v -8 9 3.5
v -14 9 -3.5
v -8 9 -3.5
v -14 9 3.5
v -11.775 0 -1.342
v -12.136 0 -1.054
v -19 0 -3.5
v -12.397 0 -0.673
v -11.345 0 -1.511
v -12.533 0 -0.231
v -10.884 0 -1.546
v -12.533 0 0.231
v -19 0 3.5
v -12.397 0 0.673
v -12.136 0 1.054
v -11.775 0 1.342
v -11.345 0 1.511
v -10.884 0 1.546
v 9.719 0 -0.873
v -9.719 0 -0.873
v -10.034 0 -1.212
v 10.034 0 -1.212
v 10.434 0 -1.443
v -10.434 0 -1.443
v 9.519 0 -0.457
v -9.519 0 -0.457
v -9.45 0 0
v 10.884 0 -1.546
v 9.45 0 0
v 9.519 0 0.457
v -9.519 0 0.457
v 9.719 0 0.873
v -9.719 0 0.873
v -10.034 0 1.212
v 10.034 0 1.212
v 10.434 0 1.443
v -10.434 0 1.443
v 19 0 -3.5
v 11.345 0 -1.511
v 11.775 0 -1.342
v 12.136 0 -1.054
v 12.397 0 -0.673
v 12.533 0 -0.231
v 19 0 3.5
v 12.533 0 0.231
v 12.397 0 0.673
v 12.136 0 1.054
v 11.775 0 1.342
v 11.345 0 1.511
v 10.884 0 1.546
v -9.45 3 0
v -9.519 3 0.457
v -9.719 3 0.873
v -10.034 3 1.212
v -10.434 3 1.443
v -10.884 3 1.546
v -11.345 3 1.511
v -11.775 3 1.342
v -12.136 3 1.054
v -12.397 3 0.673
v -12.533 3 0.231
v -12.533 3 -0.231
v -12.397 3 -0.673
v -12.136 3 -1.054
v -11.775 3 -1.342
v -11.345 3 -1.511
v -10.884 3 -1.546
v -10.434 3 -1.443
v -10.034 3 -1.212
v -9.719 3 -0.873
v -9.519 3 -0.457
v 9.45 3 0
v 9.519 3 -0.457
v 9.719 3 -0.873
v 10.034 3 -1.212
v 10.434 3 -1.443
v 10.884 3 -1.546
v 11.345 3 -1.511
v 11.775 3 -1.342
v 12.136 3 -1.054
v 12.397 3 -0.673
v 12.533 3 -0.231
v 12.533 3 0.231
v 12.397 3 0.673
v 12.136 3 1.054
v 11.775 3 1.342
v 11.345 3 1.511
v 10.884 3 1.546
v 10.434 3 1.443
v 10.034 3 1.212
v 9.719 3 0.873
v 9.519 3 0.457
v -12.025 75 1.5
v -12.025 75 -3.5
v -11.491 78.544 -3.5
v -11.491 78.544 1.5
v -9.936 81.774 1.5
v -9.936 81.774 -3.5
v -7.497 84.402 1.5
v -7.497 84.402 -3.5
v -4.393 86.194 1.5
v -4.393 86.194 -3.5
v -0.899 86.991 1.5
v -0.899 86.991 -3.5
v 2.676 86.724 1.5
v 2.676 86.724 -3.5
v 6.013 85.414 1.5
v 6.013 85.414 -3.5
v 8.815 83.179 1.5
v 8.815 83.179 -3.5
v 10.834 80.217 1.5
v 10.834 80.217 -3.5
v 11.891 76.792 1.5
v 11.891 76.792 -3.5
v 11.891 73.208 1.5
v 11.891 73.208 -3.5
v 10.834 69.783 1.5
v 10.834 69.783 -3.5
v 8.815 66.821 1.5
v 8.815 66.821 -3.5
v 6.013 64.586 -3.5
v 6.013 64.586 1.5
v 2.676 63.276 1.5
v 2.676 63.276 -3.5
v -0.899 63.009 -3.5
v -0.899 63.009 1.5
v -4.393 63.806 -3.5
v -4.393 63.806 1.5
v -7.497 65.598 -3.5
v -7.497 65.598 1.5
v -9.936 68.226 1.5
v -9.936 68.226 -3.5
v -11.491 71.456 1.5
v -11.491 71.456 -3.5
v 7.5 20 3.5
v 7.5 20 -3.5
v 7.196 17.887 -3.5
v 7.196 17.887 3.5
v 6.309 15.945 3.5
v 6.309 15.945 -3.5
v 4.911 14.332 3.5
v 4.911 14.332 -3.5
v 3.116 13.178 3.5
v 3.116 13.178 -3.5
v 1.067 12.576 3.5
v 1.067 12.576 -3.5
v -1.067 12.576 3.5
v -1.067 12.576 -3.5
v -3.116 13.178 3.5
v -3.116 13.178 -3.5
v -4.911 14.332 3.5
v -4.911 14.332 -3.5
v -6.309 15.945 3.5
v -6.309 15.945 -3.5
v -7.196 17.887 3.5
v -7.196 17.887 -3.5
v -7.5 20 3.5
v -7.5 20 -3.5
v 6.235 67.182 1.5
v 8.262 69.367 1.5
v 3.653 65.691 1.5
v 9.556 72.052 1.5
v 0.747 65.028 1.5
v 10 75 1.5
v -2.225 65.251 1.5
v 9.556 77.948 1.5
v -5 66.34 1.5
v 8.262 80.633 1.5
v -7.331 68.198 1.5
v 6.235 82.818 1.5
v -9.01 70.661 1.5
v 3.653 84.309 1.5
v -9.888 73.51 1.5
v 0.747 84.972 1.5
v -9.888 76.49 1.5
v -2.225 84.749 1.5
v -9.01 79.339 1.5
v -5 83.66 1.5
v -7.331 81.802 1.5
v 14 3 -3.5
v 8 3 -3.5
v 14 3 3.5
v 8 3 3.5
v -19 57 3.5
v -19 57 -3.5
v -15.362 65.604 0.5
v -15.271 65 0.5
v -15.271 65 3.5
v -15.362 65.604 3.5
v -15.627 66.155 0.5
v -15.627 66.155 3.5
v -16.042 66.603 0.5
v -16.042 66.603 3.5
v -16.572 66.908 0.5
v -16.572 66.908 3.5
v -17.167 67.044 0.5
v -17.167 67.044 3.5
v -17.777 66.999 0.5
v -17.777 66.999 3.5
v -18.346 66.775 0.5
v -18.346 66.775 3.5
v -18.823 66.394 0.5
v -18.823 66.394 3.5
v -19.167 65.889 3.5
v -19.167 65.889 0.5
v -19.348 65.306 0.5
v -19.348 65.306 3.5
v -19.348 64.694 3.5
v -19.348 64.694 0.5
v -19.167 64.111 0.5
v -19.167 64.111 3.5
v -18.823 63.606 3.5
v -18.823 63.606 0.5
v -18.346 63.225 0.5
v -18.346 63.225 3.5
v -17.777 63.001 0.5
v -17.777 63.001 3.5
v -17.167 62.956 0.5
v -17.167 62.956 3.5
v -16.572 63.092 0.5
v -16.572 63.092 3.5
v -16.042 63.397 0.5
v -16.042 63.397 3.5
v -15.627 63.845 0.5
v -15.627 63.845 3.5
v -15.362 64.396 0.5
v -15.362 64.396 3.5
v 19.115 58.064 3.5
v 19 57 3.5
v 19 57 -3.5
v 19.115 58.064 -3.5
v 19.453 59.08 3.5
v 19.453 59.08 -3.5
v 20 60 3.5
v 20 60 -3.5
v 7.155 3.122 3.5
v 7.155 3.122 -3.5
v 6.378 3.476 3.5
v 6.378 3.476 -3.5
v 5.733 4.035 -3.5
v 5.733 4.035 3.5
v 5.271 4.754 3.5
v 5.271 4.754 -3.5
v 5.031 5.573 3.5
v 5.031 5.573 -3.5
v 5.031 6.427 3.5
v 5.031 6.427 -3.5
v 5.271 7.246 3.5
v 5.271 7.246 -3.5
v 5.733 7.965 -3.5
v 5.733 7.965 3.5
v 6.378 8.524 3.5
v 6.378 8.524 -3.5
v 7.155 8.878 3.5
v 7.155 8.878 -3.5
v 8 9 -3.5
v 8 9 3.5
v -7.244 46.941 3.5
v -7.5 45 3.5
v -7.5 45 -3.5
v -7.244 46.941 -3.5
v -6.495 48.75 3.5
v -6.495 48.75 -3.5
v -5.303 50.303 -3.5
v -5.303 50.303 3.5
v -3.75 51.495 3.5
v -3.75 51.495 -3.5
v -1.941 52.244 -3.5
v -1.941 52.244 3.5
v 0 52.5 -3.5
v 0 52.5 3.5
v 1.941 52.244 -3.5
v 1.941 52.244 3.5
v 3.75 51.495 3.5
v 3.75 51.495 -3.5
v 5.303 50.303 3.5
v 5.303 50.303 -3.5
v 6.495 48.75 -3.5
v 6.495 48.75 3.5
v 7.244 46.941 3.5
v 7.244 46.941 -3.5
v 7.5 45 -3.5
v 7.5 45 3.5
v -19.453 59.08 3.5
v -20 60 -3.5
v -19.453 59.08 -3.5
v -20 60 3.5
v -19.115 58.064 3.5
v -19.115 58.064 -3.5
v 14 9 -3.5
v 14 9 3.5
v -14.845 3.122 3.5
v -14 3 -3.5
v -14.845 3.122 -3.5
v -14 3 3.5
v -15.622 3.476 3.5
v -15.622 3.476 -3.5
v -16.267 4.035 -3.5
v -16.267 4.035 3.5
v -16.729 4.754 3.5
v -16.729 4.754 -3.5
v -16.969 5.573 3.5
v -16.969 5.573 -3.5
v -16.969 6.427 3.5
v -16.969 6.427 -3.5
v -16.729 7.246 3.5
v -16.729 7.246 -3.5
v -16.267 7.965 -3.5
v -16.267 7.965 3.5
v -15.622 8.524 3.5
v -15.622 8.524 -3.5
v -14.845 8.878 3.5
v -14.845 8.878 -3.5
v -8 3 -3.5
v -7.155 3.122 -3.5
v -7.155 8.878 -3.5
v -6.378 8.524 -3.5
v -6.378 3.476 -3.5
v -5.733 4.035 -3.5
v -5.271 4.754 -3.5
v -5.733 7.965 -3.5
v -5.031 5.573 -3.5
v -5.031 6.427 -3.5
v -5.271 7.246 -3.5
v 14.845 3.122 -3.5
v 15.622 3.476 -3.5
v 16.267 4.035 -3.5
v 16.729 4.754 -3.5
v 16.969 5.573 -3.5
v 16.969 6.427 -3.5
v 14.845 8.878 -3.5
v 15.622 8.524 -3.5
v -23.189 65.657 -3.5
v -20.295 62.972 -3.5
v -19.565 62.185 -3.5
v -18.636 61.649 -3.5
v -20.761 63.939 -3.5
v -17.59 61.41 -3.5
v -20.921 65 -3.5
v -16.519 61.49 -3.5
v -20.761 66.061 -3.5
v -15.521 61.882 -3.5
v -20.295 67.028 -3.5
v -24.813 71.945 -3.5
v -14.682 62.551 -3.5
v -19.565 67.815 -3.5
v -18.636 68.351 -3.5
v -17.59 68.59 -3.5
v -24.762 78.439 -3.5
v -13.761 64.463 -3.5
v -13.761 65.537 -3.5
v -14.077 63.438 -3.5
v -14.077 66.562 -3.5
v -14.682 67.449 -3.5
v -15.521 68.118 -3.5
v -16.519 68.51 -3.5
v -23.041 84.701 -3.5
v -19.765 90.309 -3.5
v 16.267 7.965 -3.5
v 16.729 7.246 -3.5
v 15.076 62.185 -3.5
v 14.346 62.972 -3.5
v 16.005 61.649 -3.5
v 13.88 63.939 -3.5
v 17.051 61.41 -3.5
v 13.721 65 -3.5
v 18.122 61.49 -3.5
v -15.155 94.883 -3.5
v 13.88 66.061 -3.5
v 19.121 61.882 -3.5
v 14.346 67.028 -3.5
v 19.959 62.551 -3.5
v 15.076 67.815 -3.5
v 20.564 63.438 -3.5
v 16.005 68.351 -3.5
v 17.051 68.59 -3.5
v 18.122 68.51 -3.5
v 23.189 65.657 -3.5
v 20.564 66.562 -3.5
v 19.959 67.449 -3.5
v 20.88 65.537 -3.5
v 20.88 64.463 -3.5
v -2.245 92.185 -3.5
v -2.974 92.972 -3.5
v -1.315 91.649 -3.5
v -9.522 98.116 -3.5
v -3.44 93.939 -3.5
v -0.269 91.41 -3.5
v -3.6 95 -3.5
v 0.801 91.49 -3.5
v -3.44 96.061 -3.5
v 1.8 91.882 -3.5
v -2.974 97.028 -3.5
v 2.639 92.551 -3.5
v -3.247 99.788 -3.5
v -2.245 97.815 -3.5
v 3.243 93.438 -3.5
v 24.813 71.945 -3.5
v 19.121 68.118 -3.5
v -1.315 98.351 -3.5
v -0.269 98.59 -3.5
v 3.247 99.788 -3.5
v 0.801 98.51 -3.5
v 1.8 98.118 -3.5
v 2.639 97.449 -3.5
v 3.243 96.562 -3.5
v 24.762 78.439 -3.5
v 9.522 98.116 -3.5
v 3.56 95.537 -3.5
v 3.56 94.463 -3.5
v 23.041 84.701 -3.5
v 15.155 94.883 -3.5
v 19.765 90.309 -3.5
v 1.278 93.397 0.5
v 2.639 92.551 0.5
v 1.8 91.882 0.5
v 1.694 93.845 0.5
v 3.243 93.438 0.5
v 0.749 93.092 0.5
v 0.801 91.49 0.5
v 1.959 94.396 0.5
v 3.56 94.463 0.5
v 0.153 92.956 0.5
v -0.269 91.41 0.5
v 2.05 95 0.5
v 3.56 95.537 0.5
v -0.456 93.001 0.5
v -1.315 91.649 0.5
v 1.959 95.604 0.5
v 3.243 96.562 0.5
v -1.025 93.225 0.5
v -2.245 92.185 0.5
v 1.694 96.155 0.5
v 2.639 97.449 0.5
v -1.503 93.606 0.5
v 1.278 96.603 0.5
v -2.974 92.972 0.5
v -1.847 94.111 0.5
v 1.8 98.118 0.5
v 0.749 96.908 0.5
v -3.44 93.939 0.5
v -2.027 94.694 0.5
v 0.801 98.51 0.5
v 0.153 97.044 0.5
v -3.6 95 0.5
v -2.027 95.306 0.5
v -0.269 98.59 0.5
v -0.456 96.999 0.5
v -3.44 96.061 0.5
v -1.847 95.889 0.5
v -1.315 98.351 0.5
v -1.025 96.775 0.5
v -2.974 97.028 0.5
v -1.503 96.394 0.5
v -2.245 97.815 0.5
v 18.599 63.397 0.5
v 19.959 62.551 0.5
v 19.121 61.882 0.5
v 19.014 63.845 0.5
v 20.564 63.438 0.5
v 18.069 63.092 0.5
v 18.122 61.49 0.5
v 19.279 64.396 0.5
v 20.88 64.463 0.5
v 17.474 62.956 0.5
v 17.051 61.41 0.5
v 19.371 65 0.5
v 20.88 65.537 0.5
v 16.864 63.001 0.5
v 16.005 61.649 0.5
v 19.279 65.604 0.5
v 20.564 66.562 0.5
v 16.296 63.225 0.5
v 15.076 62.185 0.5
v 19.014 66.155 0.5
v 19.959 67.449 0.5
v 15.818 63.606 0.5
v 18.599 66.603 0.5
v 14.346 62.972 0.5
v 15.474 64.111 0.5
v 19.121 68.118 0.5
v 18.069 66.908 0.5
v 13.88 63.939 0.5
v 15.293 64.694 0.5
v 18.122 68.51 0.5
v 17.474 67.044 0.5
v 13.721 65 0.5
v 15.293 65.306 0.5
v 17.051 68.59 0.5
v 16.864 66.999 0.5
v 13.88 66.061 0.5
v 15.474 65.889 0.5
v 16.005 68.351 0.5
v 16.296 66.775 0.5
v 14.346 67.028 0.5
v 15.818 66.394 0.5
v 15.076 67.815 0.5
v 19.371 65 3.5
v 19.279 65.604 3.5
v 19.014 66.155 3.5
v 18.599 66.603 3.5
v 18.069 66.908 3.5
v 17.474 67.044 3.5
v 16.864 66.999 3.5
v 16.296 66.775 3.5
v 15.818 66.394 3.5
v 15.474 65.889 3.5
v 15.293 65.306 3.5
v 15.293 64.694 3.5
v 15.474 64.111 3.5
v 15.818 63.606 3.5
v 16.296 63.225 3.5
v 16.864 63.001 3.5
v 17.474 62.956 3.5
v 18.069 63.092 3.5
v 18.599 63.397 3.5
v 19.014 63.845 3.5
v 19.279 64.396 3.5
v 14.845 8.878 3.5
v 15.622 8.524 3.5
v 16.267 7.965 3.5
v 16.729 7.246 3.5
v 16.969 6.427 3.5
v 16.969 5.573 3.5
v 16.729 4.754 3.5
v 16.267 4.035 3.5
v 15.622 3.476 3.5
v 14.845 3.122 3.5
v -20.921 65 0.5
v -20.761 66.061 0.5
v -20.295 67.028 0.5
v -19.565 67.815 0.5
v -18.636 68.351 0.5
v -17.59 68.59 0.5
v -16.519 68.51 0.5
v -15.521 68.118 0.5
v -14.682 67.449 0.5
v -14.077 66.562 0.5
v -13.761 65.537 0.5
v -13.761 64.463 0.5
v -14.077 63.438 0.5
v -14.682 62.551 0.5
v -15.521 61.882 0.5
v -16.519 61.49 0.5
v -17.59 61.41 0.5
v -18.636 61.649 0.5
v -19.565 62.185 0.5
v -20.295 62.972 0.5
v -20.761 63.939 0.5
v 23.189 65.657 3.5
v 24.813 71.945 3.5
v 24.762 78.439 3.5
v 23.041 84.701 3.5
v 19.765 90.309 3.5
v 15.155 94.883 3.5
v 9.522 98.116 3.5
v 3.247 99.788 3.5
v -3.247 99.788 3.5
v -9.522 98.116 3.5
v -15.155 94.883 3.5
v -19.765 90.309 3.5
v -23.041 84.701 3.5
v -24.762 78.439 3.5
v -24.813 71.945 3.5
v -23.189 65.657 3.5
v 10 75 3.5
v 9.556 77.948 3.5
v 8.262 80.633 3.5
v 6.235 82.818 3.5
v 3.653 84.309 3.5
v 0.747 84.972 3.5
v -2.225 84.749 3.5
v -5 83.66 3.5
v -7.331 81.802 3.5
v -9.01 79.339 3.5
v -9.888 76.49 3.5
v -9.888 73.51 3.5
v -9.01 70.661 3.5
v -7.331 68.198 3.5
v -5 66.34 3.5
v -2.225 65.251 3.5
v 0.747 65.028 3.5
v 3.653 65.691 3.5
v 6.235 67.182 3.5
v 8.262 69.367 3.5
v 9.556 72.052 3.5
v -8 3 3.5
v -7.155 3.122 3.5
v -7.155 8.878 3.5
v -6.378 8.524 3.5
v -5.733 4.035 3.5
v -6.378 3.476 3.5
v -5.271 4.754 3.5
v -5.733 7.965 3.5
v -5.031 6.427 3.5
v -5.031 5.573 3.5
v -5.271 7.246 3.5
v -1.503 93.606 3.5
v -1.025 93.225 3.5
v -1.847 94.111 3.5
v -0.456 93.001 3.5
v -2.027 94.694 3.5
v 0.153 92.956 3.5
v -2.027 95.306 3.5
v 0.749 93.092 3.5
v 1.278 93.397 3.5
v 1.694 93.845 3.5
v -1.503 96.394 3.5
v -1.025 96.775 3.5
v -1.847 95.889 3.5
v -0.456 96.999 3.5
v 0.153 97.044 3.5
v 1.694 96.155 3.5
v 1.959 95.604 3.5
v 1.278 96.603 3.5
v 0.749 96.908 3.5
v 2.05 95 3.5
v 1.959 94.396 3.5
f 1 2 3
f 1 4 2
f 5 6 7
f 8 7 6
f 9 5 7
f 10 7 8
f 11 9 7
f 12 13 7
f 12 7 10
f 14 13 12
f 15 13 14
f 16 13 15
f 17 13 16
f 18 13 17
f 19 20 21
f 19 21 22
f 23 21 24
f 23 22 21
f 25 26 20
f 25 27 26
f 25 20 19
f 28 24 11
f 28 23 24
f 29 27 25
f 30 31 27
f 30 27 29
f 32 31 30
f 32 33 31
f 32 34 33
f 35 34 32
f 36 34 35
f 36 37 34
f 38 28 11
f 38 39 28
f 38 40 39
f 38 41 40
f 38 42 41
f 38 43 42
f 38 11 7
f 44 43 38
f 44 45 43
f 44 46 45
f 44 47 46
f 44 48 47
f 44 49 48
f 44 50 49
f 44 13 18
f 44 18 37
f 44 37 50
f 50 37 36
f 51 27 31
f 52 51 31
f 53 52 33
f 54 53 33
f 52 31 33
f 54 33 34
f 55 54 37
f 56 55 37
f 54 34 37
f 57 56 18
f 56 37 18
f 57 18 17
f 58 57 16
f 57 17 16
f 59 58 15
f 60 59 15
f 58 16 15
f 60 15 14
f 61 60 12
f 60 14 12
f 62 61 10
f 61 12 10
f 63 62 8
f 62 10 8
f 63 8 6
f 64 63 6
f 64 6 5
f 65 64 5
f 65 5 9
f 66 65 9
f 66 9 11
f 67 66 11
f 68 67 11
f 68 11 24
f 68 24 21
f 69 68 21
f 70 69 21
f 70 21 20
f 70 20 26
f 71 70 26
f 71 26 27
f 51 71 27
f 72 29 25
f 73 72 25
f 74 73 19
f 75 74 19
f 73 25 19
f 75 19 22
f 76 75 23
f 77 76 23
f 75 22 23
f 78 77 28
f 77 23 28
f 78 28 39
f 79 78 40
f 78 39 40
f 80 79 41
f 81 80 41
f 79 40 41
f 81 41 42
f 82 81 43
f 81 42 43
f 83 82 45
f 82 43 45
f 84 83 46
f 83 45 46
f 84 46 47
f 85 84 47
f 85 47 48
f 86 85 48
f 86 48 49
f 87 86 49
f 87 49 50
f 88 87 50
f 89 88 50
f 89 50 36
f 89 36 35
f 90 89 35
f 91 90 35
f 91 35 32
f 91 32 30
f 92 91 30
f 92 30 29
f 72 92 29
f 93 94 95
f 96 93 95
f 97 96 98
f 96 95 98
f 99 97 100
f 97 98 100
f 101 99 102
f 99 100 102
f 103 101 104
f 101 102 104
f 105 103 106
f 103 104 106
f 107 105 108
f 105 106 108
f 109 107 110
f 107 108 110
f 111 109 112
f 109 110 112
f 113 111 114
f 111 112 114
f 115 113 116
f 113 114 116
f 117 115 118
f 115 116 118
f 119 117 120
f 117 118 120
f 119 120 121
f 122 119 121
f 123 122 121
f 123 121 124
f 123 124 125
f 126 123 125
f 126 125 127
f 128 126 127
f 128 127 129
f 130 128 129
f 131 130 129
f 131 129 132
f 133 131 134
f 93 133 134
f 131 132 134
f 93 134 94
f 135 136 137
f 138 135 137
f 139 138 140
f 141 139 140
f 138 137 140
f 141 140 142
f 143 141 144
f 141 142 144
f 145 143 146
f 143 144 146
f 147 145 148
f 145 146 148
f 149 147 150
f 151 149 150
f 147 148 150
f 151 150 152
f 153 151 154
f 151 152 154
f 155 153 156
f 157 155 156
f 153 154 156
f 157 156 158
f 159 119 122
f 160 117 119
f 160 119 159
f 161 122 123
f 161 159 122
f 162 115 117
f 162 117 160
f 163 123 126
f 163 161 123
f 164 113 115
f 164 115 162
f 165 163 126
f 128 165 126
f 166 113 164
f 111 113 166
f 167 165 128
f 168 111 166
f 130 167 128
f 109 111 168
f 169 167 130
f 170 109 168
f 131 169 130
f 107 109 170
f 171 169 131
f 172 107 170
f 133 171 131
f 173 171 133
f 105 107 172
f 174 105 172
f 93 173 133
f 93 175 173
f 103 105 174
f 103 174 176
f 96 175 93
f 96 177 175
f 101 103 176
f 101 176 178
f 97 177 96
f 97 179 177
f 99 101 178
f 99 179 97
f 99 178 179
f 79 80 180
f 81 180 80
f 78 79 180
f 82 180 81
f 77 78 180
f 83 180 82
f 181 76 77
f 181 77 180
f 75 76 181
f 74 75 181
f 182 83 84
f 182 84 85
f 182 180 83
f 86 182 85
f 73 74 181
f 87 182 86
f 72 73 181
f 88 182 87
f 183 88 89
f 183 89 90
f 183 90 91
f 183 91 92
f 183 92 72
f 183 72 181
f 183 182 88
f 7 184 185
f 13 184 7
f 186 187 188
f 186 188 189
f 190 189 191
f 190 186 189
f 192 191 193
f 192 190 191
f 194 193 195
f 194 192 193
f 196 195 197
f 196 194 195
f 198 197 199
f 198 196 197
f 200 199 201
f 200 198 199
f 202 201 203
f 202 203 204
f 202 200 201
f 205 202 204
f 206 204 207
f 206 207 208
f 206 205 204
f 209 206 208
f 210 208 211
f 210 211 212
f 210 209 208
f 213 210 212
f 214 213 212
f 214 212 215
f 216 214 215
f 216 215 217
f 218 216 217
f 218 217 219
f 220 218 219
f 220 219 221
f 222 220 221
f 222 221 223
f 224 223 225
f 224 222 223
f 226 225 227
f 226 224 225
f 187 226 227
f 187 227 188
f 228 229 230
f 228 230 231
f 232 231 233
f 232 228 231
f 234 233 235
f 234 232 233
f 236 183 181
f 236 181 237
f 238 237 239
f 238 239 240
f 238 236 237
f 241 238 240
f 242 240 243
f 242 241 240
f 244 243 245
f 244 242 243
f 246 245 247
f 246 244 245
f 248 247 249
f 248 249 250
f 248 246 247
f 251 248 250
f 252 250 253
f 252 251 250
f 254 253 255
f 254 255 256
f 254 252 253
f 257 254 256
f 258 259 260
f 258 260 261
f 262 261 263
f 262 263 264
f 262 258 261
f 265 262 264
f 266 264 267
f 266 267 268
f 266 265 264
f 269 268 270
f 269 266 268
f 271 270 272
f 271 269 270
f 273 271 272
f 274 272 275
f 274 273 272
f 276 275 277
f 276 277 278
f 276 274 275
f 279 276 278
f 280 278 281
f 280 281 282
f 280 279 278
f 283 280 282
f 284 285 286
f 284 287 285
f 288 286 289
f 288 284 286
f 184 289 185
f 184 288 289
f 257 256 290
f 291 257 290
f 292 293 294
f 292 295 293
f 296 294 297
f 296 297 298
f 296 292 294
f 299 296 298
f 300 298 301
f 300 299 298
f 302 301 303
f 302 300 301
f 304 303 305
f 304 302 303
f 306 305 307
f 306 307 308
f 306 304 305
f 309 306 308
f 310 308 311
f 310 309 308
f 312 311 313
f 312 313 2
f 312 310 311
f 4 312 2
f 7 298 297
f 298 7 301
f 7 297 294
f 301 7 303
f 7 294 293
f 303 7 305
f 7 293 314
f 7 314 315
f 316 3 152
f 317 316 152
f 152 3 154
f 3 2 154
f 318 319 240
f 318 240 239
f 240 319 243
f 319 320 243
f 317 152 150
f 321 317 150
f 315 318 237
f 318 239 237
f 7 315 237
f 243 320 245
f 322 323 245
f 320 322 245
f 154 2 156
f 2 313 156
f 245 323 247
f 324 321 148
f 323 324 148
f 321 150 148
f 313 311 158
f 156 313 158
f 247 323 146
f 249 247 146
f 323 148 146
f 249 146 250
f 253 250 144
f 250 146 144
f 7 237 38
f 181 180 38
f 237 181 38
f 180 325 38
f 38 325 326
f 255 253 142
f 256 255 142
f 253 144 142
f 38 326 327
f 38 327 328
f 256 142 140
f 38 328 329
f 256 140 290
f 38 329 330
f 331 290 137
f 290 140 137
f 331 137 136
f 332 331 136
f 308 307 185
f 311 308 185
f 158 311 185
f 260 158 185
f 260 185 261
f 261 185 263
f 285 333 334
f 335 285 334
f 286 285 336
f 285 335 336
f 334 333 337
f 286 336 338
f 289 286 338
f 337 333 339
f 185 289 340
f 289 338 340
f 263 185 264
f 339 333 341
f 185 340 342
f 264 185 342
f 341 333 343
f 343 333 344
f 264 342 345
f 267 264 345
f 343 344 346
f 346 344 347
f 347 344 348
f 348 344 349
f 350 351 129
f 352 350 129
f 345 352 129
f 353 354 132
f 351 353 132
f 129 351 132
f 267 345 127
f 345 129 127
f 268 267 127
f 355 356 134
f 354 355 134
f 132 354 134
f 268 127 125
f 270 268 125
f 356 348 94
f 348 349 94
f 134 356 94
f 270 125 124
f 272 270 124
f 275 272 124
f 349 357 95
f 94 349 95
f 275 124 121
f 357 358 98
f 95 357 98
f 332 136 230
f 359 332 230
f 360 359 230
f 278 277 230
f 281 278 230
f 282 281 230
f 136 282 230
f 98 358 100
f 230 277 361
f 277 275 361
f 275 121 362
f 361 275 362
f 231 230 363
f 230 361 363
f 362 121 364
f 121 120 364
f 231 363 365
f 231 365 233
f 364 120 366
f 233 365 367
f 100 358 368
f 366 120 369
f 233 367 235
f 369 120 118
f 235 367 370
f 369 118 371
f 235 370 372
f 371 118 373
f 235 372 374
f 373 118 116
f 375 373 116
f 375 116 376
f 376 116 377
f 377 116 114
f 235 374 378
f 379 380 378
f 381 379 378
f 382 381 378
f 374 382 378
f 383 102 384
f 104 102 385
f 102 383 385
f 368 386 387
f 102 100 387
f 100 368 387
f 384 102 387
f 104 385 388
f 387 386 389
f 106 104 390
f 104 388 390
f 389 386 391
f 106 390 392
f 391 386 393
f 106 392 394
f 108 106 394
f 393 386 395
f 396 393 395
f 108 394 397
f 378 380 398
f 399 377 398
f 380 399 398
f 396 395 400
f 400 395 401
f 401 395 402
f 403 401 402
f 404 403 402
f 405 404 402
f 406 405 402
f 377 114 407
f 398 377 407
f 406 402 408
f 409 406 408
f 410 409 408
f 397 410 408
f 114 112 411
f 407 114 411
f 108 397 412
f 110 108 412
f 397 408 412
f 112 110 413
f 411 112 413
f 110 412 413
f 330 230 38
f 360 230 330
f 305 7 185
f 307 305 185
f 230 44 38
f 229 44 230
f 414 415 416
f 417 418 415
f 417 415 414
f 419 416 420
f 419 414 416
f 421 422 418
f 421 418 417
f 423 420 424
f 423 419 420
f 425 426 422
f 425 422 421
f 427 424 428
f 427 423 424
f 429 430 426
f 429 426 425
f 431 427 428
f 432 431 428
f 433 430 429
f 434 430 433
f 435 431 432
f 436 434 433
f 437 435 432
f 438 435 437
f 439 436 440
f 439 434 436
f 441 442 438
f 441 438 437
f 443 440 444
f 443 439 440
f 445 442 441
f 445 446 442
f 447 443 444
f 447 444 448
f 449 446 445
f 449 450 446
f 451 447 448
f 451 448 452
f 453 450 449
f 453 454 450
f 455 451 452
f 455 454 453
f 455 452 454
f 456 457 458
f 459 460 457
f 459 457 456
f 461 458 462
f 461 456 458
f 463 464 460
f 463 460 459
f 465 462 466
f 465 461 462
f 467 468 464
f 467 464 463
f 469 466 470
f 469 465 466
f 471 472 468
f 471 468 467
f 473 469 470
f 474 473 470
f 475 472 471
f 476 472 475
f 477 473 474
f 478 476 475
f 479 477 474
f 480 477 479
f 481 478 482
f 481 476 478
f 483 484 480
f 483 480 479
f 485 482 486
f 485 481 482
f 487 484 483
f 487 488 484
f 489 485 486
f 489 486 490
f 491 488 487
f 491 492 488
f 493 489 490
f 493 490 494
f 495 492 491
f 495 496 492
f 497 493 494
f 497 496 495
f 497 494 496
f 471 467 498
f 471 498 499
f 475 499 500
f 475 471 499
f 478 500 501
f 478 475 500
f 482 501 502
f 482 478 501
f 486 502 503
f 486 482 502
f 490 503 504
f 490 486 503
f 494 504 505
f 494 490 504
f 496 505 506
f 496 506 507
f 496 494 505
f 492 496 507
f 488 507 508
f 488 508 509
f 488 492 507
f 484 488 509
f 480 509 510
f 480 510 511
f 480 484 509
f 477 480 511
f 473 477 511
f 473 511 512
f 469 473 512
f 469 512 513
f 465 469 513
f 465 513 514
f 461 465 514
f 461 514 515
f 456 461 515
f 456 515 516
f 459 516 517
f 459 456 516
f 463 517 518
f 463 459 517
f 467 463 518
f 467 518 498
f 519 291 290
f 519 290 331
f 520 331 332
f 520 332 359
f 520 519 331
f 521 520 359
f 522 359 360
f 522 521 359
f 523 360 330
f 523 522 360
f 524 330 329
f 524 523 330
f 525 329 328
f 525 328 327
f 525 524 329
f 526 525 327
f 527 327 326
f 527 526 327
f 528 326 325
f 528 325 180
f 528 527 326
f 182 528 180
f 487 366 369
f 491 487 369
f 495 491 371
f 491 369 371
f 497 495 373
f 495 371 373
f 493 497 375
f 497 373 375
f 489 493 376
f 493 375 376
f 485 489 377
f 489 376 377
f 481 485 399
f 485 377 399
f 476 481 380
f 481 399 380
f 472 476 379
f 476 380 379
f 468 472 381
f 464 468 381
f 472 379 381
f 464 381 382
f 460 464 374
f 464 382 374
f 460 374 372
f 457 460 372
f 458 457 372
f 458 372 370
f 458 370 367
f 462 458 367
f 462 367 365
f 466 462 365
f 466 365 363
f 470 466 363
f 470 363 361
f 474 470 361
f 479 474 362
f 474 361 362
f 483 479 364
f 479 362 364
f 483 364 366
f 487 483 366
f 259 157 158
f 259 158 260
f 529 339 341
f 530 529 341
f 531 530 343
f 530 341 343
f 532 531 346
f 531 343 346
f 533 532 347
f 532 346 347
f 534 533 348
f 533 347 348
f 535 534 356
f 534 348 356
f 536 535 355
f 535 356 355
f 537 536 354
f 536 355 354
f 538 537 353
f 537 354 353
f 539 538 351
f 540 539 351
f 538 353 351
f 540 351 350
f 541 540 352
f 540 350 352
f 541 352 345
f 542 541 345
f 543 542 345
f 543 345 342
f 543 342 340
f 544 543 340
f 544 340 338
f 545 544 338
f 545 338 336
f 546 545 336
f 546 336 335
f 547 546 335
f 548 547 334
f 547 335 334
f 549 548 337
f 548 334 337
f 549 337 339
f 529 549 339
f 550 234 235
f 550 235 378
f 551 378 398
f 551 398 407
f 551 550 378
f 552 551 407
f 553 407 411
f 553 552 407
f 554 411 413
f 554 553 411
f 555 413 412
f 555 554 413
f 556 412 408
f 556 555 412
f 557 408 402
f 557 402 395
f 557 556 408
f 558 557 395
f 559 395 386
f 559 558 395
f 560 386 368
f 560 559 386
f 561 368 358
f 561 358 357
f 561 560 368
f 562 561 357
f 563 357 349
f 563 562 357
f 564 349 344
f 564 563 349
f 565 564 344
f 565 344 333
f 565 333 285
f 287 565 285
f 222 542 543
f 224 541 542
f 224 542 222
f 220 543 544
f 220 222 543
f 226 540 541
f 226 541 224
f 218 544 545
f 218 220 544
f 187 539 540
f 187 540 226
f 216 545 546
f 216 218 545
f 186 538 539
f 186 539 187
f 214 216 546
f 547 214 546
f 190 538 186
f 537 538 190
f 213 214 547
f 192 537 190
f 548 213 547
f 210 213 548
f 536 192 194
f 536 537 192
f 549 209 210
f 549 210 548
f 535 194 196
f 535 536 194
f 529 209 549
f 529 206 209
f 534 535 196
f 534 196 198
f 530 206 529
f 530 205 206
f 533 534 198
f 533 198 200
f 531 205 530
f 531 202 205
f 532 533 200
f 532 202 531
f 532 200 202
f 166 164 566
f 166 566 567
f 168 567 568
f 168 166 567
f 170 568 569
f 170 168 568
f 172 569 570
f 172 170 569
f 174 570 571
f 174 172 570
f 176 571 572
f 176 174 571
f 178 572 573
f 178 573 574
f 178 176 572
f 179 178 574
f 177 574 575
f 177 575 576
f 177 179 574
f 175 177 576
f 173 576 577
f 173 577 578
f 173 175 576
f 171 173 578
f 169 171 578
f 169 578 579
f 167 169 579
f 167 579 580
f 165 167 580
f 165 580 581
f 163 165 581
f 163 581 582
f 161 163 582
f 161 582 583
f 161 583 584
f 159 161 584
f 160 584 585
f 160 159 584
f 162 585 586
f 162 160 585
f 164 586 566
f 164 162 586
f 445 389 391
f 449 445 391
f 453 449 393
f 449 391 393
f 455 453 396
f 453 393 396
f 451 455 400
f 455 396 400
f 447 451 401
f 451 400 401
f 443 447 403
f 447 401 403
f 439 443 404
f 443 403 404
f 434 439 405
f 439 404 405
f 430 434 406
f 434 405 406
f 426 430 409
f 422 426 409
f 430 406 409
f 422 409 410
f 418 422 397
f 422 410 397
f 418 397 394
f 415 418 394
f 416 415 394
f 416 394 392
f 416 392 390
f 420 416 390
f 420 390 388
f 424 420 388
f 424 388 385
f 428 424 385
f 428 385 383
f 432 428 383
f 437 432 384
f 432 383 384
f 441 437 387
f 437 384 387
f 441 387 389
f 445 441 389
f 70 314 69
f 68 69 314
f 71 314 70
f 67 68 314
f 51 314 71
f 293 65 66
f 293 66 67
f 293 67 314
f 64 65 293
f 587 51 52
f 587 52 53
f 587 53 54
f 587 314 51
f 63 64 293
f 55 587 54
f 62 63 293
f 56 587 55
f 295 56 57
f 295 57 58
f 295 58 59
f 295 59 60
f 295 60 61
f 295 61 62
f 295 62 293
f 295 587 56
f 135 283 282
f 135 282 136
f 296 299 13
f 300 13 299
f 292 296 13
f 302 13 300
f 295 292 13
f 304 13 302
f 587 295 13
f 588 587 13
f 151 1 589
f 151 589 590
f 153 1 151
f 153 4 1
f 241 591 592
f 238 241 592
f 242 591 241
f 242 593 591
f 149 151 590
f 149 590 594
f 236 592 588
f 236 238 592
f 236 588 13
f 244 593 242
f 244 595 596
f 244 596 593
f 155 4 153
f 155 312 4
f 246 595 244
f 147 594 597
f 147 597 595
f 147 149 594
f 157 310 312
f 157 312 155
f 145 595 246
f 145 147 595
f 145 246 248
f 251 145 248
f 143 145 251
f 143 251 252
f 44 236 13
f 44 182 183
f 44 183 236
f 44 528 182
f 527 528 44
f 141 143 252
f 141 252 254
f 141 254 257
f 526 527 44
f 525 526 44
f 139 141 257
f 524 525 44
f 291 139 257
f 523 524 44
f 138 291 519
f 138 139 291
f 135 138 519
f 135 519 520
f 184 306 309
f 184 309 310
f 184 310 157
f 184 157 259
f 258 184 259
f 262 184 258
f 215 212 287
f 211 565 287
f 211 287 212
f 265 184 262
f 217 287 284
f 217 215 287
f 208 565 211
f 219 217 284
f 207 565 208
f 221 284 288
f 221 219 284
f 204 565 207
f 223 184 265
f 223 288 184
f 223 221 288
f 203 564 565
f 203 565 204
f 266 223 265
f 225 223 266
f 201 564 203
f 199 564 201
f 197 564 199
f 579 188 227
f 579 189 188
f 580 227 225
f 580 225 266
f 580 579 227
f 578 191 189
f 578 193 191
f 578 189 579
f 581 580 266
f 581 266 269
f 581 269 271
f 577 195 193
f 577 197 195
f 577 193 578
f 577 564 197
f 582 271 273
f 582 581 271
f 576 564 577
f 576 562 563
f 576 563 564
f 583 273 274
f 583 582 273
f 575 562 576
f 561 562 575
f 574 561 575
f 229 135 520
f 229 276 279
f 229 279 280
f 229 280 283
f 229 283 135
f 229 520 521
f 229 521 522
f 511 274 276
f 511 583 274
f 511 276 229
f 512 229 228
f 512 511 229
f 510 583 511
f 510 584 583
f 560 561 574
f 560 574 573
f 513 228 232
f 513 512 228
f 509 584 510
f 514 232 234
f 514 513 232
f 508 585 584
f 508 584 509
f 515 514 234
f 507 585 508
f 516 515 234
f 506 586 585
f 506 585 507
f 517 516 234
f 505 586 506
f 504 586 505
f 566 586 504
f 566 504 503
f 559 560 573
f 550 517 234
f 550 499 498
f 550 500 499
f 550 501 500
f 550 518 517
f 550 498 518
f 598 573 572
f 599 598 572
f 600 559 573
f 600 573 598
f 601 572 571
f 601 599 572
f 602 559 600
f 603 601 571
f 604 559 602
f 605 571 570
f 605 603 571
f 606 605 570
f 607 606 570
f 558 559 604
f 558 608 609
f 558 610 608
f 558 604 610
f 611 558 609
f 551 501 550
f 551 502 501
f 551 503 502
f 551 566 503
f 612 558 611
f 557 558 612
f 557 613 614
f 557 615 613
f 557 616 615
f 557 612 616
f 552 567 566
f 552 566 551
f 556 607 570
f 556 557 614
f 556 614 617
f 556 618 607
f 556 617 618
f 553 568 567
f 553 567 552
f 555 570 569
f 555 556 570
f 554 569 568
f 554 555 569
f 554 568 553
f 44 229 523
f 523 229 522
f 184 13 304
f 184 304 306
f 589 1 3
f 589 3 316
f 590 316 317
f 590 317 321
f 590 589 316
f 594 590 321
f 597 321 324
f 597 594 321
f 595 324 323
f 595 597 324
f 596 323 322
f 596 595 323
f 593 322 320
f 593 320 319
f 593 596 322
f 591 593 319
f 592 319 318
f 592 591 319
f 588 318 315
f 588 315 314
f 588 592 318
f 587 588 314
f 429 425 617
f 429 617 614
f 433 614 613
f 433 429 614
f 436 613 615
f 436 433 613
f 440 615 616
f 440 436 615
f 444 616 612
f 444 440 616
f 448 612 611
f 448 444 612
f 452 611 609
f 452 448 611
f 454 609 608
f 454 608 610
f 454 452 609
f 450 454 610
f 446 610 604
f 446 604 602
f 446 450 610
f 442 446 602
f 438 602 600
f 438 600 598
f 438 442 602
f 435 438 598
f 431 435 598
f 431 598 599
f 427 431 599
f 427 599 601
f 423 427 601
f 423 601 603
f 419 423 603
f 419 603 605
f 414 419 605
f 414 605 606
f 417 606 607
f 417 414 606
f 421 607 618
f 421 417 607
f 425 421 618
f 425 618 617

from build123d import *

# Parameters (mm, degrees)
SKETCH_1_R         = 2.05
SKETCH_1_R_2       = 10
EXTRUDE_1_DEPTH    = 3.5
SKETCH1_R          = 12.025
CUT_EXTRUDE2_DEPTH = 5
SKETCH3_R          = 3.6
CUT_EXTRUDE4_DEPTH = 4
SKETCH4_R          = 1.55
CUT_EXTRUDE5_DEPTH = 5


with BuildPart() as part:
    # 草图1 → 凸台-拉伸1 (new, symmetric)
    with BuildSketch(Plane.XY):
        with BuildLine():
            Line((-19, 0), (19, 0))
            Line((19, 0), (19, 57))
            ThreePointArc((19, 57), (19.25658351, 58.58113883), (20, 60))
            ThreePointArc((20, 60), (0, 100), (-20, 60))
            ThreePointArc((-20, 60), (-19.25658351, 58.58113883), (-19, 57))
            Line((-19, 57), (-19, 0))
        make_face()
        with BuildLine():
            Line((7.5, 45), (7.5, 20))
            ThreePointArc((7.5, 20), (0, 12.5), (-7.5, 20))
            Line((-7.5, 20), (-7.5, 45))
            ThreePointArc((-7.5, 45), (-5.303300859, 50.303300859), (0, 52.5))
            ThreePointArc((0, 52.5), (5.303300859, 50.303300859), (7.5, 45))
        make_face(mode=Mode.SUBTRACT)
        with BuildLine():
            ThreePointArc((-8, 9), (-5, 6), (-8, 3))
            Line((-8, 3), (-14, 3))
            ThreePointArc((-14, 3), (-17, 6), (-14, 9))
            Line((-14, 9), (-8, 9))
        make_face(mode=Mode.SUBTRACT)
        with BuildLine():
            ThreePointArc((8, 3), (5, 6), (8, 9))
            Line((8, 9), (14, 9))
            ThreePointArc((14, 9), (17, 6), (14, 3))
            Line((14, 3), (8, 3))
        make_face(mode=Mode.SUBTRACT)
        with Locations((0, 95)):
            Circle(SKETCH_1_R, mode=Mode.SUBTRACT)
        with Locations((-17.320508076, 65)):
            Circle(SKETCH_1_R, mode=Mode.SUBTRACT)
        with Locations((0, 75)):
            Circle(SKETCH_1_R_2, mode=Mode.SUBTRACT)
        with Locations((17.320508076, 65)):
            Circle(SKETCH_1_R, mode=Mode.SUBTRACT)
    extrude(amount=EXTRUDE_1_DEPTH, both=True)

    # Sketch1 → Cut-Extrude2 (cut)
    with BuildSketch(Plane(origin=(0, 0, -3.5), x_dir=(-1, 0, 0), z_dir=(0, 0, -1))):
        with Locations((0, 75)):
            Circle(SKETCH1_R)
    extrude(amount=-CUT_EXTRUDE2_DEPTH, mode=Mode.SUBTRACT)

    # Sketch3 → Cut-Extrude4 (cut)
    with BuildSketch(Plane(origin=(0, 0, -3.5), x_dir=(-1, 0, 0), z_dir=(0, 0, -1))):
        with Locations((0, 95)):
            Circle(SKETCH3_R)
        with Locations((17.320508076, 65)):
            Circle(SKETCH3_R)
        with Locations((-17.320508076, 65)):
            Circle(SKETCH3_R)
    extrude(amount=-CUT_EXTRUDE4_DEPTH, mode=Mode.SUBTRACT)

    # Sketch4 → Cut-Extrude5 (cut)
    with BuildSketch(Plane(origin=(0, 0, 0), x_dir=(-1, 0, 0), z_dir=(0, -1, 0))):
        with Locations(Location((11, 0, 0), (0, 0, 180))):
            Circle(SKETCH4_R)
        with Locations((-11, 0)):
            Circle(SKETCH4_R)
    extrude(amount=-CUT_EXTRUDE5_DEPTH, mode=Mode.SUBTRACT)


solid = part.part
